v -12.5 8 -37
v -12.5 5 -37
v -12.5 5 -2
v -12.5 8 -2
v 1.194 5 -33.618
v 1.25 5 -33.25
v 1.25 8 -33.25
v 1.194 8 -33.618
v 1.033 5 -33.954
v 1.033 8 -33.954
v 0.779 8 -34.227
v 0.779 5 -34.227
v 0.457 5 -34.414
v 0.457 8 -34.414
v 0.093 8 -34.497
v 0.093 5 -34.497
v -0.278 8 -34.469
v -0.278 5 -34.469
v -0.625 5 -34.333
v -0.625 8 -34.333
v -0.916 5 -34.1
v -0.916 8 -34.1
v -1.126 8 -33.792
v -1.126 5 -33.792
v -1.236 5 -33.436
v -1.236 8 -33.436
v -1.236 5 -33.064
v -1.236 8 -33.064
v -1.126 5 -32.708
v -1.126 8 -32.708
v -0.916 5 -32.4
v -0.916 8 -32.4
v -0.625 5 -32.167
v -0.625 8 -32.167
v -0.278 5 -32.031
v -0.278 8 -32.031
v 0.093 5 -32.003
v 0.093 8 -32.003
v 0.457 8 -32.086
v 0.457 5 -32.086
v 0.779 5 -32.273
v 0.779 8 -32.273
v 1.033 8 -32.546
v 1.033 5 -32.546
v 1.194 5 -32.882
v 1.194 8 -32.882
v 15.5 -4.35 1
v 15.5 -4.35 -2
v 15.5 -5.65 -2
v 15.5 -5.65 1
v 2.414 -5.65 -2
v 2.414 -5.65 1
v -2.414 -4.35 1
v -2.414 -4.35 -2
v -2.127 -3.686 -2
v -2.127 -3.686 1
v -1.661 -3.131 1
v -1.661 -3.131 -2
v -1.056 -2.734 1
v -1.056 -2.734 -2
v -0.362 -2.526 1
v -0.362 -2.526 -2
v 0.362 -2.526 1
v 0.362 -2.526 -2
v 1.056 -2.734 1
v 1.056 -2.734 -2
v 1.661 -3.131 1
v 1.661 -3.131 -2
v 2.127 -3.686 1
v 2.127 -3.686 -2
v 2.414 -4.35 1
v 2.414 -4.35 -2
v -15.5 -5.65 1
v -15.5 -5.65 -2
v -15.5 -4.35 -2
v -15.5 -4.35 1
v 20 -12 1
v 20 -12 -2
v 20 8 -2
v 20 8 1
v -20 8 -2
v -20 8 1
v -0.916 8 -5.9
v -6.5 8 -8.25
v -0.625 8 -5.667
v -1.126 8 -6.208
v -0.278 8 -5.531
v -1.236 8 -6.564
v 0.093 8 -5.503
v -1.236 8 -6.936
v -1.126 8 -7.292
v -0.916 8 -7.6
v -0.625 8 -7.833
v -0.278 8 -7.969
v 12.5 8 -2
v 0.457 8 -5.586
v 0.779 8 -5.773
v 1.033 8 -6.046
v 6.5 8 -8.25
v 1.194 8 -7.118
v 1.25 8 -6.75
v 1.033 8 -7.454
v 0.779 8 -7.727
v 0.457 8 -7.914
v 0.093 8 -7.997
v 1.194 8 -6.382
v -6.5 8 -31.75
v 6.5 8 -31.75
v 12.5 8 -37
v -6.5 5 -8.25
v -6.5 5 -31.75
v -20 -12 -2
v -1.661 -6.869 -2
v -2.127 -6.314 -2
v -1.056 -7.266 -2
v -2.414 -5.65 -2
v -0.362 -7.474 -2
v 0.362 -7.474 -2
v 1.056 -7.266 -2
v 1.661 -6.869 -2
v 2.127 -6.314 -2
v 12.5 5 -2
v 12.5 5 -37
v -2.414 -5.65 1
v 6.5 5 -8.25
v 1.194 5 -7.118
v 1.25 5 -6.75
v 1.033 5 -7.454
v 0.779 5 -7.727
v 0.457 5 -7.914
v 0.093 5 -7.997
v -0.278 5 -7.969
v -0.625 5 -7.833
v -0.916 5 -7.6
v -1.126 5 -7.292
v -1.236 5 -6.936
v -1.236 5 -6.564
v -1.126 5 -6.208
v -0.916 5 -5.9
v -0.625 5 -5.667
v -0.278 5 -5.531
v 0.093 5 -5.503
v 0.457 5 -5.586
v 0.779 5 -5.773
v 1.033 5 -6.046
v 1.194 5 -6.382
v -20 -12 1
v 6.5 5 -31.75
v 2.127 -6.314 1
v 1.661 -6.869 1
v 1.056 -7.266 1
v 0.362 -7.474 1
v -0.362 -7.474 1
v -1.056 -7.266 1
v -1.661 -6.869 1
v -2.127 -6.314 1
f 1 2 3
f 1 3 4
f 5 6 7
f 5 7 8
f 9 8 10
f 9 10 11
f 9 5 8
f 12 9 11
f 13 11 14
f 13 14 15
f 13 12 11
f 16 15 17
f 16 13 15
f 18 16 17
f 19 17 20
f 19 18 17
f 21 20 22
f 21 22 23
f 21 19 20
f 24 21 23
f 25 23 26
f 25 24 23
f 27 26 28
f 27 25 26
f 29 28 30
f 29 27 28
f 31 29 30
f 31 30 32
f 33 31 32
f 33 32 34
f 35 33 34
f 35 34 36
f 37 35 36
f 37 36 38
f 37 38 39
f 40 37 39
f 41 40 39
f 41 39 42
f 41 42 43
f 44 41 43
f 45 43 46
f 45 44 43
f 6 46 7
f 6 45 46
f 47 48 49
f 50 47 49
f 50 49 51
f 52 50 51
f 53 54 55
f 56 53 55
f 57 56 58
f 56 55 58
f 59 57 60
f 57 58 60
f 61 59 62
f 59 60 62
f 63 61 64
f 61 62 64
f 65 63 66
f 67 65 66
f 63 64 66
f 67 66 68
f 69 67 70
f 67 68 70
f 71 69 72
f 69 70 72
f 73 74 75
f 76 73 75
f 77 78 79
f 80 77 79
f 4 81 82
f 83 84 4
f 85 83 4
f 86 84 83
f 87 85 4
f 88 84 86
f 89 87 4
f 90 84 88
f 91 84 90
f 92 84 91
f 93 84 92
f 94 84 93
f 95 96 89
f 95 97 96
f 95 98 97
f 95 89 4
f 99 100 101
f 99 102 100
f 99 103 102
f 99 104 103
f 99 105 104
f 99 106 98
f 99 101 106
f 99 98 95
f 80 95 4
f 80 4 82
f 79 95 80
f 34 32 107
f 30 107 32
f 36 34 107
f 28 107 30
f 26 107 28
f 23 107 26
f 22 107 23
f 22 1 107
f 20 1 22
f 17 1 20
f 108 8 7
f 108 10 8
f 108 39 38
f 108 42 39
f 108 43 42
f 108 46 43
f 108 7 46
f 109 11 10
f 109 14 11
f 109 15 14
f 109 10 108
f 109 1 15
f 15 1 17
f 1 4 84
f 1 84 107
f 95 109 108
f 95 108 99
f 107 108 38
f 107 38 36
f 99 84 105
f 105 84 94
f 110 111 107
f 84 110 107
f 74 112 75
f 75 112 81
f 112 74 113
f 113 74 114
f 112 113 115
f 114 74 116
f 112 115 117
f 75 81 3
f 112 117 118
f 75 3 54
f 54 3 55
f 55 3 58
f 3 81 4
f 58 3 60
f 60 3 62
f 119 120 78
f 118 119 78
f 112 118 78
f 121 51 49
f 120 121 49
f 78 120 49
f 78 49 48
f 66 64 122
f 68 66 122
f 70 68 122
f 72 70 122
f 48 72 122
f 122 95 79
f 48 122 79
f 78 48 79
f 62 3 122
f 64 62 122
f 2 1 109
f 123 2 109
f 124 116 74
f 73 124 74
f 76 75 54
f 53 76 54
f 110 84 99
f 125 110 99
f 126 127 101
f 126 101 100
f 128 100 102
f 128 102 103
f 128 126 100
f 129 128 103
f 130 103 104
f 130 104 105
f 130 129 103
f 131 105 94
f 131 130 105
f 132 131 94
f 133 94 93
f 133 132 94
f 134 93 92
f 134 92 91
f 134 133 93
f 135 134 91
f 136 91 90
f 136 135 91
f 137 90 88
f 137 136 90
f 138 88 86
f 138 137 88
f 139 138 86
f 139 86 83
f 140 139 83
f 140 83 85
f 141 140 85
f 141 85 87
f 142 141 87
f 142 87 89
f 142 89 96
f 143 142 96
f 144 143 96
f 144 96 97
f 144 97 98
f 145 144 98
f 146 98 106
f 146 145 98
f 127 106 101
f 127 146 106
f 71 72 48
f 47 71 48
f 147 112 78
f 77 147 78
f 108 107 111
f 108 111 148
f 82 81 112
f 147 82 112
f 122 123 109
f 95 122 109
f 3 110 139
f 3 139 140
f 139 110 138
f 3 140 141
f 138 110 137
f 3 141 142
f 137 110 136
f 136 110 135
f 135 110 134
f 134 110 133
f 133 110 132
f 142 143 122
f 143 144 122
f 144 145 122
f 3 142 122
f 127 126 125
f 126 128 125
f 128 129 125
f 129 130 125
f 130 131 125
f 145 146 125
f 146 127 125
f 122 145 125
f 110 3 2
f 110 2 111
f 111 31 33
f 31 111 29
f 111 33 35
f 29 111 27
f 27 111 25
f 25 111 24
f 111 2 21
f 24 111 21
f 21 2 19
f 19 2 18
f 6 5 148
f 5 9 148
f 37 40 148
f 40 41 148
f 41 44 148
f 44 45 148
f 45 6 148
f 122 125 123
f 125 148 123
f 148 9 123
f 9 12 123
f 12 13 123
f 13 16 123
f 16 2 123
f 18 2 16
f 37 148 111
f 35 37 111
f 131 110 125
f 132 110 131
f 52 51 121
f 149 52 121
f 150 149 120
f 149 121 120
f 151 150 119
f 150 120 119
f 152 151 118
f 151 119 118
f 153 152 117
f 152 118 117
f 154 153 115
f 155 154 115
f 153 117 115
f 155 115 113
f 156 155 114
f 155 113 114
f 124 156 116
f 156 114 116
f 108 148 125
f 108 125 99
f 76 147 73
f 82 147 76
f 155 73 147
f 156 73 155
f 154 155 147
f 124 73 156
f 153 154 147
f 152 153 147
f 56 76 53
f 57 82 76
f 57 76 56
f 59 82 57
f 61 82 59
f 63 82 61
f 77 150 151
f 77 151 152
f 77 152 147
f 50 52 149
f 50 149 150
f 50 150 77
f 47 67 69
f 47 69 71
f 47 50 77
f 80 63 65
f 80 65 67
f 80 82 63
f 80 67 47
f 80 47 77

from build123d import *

# Parameters (mm, degrees)
ESBO_O1_W                         = 40
ESBO_O1_H                         = 20
RESSALTO_EXTRUS_O1_DEPTH          = 1
ESBO_O3_W                         = 40
ESBO_O3_H                         = 20
RESSALTO_EXTRUS_O2_DEPTH          = 2
CORTE_EXTRUS_O1_REACH             = 25.409
CORTE_EXTRUS_O1_DIRECTION_2_REACH = 25.409
ESBO_O4_W                         = 25
ESBO_O4_H                         = 35
ESBO_O4_R                         = 1.25
ESBO_O4_W_2                       = 13
ESBO_O4_H_2                       = 23.5
ESBO_O4_H_3                       = 3
RESSALTO_EXTRUS_O3_DEPTH          = 3
BODY_MOVE_COPY1_START             = 1
BODY_MOVE_COPY1_OUTLINE_W         = 40
BODY_MOVE_COPY1_OUTLINE_H         = 20
BODY_MOVE_COPY1_DEPTH             = 36
BODY_MOVE_COPY1_START_2           = -37
BODY_MOVE_COPY1_2_OUTLINE_W       = 6
BODY_MOVE_COPY1_2_OUTLINE_H       = 3
BODY_MOVE_COPY1_2_DEPTH           = 36
BODY_MOVE_COPY1_START_3           = -2
BODY_MOVE_COPY1_3_DEPTH           = 1
BODY_MOVE_COPY1_START_4           = -8.25
BODY_MOVE_COPY1_4_OUTLINE_W       = 13
BODY_MOVE_COPY1_4_OUTLINE_H       = 3
BODY_MOVE_COPY1_4_DEPTH           = 6.25
BODY_MOVE_COPY1_5_OUTLINE_W       = 13
BODY_MOVE_COPY1_5_OUTLINE_H       = 3
BODY_MOVE_COPY1_5_DEPTH           = 5.25
BODY_MOVE_COPY1_START_5           = 5
BODY_MOVE_COPY1_6_OUTLINE_R       = 1.25
BODY_MOVE_COPY1_6_DEPTH           = 3


with BuildPart() as part:
    # Esboço1 → Ressalto-extrusão1 (new body)
    with BuildSketch(Plane.XY):
        with Locations((0, -2)):
            Rectangle(ESBO_O1_W, ESBO_O1_H)
    extrude(amount=-RESSALTO_EXTRUS_O1_DEPTH)

    # Esboço3 → Ressalto-extrusão2 (add)
    with BuildSketch(Plane.XY):
        with Locations((0, -2)):
            Rectangle(ESBO_O3_W, ESBO_O3_H)
    extrude(amount=RESSALTO_EXTRUS_O2_DEPTH)

    # Corte-extrusão1: up to this face of the body (flat: up to its plane)
    corte_extrus_o1_end = Plane(part.part.faces().sort_by_distance((0, -2, 2))[0])
    # Esboço2 → Corte-extrusão1 (cut, up to the picked face)
    with BuildSketch(Plane.XY, mode=Mode.PRIVATE) as corte_extrus_o1_sk1:
        with BuildLine():
            Line((-2.414021541, -4.35), (-15.5, -4.35))
            Line((-15.5, -4.35), (-15.5, -5.65))
            Line((-15.5, -5.65), (-2.414021541, -5.65))
            ThreePointArc((-2.414021541, -5.65), (0, -7.5), (2.414021541, -5.65))
            Line((2.414021541, -5.65), (15.5, -5.65))
            Line((15.5, -5.65), (15.5, -4.35))
            Line((15.5, -4.35), (2.414021541, -4.35))
            ThreePointArc((2.414021541, -4.35), (0, -2.5), (-2.414021541, -4.35))
        make_face()
    corte_extrus_o1_tool1 = split(extrude(corte_extrus_o1_sk1.sketch, amount=CORTE_EXTRUS_O1_REACH, mode=Mode.PRIVATE), bisect_by=corte_extrus_o1_end, keep=Keep.BOTH, mode=Mode.PRIVATE)
    add(corte_extrus_o1_tool1.solids().sort_by(Axis((0, -5, 0), (0, 0, 1)))[0], mode=Mode.SUBTRACT)

    # Corte-extrusão1 direction 2: up to this face of the body (flat: up to its plane)
    corte_extrus_o1_direction_2_end = Plane(part.part.faces().sort_by_distance((0, -2, -1))[0])
    # Esboço2 → Corte-extrusão1 direction 2 (cut, up to the picked face)
    with BuildSketch(Plane.XY, mode=Mode.PRIVATE) as corte_extrus_o1_direction_2_sk1:
        with BuildLine():
            Line((-2.414021541, -4.35), (-15.5, -4.35))
            Line((-15.5, -4.35), (-15.5, -5.65))
            Line((-15.5, -5.65), (-2.414021541, -5.65))
            ThreePointArc((-2.414021541, -5.65), (0, -7.5), (2.414021541, -5.65))
            Line((2.414021541, -5.65), (15.5, -5.65))
            Line((15.5, -5.65), (15.5, -4.35))
            Line((15.5, -4.35), (2.414021541, -4.35))
            ThreePointArc((2.414021541, -4.35), (0, -2.5), (-2.414021541, -4.35))
        make_face()
    corte_extrus_o1_direction_2_tool1 = split(extrude(corte_extrus_o1_direction_2_sk1.sketch, amount=-CORTE_EXTRUS_O1_DIRECTION_2_REACH, mode=Mode.PRIVATE), bisect_by=corte_extrus_o1_direction_2_end, keep=Keep.BOTH, mode=Mode.PRIVATE)
    add(corte_extrus_o1_direction_2_tool1.solids().sort_by(Axis((0, -5, 0), (0, 0, -1)))[0], mode=Mode.SUBTRACT)

    # Esboço4 → Ressalto-extrusão3 (add)
    # profile 1 of 2: a face of its own
    with BuildSketch(Plane(origin=(0, 8, 0), x_dir=(1, 0, 0), z_dir=(0, 1, 0))):
        with Locations((0, -19.5)):
            Rectangle(ESBO_O4_W, ESBO_O4_H)
        with Locations(Location((0, -33.25, 0), (0, 0, 180))):
            Circle(ESBO_O4_R, mode=Mode.SUBTRACT)
        with Locations((0, -20)):
            Rectangle(ESBO_O4_W_2, ESBO_O4_H_2, mode=Mode.SUBTRACT)
        with Locations(Location((0, -6.75, 0), (0, 0, 180))):
            Circle(ESBO_O4_R, mode=Mode.SUBTRACT)
    # profile 2 of 2: a face of its own
    with BuildSketch(Plane(origin=(0, 8, 0), x_dir=(1, 0, 0), z_dir=(0, 1, 0))):
        with Locations((0, -0.5)):
            Rectangle(ESBO_O4_W, ESBO_O4_H_3)
    extrude(amount=-RESSALTO_EXTRUS_O3_DEPTH)

    # Body-Move/Copy1: read off the stored shape, not the designer's step
    # Body-Move/Copy1 outline → Body-Move/Copy1 (cut)
    with BuildSketch(Plane.XY.offset(BODY_MOVE_COPY1_START)):
        with Locations((0, -2)):
            Rectangle(BODY_MOVE_COPY1_OUTLINE_W, BODY_MOVE_COPY1_OUTLINE_H)
        with BuildLine():
            ThreePointArc((-2.414021541, -4.35), (0, -2.5), (2.414021541, -4.35))
            Line((2.414021541, -4.35), (15.5, -4.35))
            Line((15.5, -4.35), (15.5, -5.65))
            Line((15.5, -5.65), (2.414021541, -5.65))
            ThreePointArc((2.414021541, -5.65), (0, -7.5), (-2.414021541, -5.65))
            Line((-2.414021541, -5.65), (-15.5, -5.65))
            Line((-15.5, -5.65), (-15.5, -4.35))
            Line((-15.5, -4.35), (-2.414021541, -4.35))
        make_face(mode=Mode.SUBTRACT)
    extrude(amount=BODY_MOVE_COPY1_DEPTH, mode=Mode.SUBTRACT)

    # Body-Move_Copy1 2 outline → Body-Move_Copy1 2 (add)
    with BuildSketch(Plane.XY.offset(BODY_MOVE_COPY1_START_2)):
        with Locations((-9.5, 6.5)):
            Rectangle(BODY_MOVE_COPY1_2_OUTLINE_W, BODY_MOVE_COPY1_2_OUTLINE_H)
        with Locations((9.5, 6.5)):
            Rectangle(BODY_MOVE_COPY1_2_OUTLINE_W, BODY_MOVE_COPY1_2_OUTLINE_H)
    extrude(amount=BODY_MOVE_COPY1_2_DEPTH)

    # Body-Move_Copy1 3 outline → Body-Move_Copy1 3 (add)
    with BuildSketch(Plane.XY.offset(BODY_MOVE_COPY1_START_3)):
        Polygon((-20, 8), (-20, -12), (20, -12), (20, 8), (12.5, 8), (12.5, 5), (6.5, 5), (6.5, 8), (-6.5, 8), (-6.5, 5), (-12.5, 5), (-12.5, 8), align=None)
        with BuildLine():
            ThreePointArc((-2.414021541, -4.35), (0, -2.5), (2.414021541, -4.35))
            Line((2.414021541, -4.35), (15.5, -4.35))
            Line((15.5, -4.35), (15.5, -5.65))
            Line((15.5, -5.65), (2.414021541, -5.65))
            ThreePointArc((2.414021541, -5.65), (0, -7.5), (-2.414021541, -5.65))
            Line((-2.414021541, -5.65), (-15.5, -5.65))
            Line((-15.5, -5.65), (-15.5, -4.35))
            Line((-15.5, -4.35), (-2.414021541, -4.35))
        make_face(mode=Mode.SUBTRACT)
    extrude(amount=BODY_MOVE_COPY1_3_DEPTH)

    # Body-Move_Copy1 4 outline → Body-Move_Copy1 4 (add)
    with BuildSketch(Plane.XY.offset(BODY_MOVE_COPY1_START_4)):
        with Locations((0, 6.5)):
            Rectangle(BODY_MOVE_COPY1_4_OUTLINE_W, BODY_MOVE_COPY1_4_OUTLINE_H)
    extrude(amount=BODY_MOVE_COPY1_4_DEPTH)

    # Body-Move_Copy1 5 outline → Body-Move_Copy1 5 (add)
    with BuildSketch(Plane.XY.offset(BODY_MOVE_COPY1_START_2)):
        with Locations((0, 6.5)):
            Rectangle(BODY_MOVE_COPY1_5_OUTLINE_W, BODY_MOVE_COPY1_5_OUTLINE_H)
    extrude(amount=BODY_MOVE_COPY1_5_DEPTH)

    # Body-Move_Copy1 6 outline → Body-Move_Copy1 6 (cut)
    with BuildSketch(Plane(origin=(0, 0, 0), x_dir=(1, 0, 0), z_dir=(0, 1, 0)).offset(BODY_MOVE_COPY1_START_5)):
        with Locations((0, 6.75)):
            Circle(BODY_MOVE_COPY1_6_OUTLINE_R)
        with Locations((0, 33.25)):
            Circle(BODY_MOVE_COPY1_6_OUTLINE_R)
    extrude(amount=BODY_MOVE_COPY1_6_DEPTH, mode=Mode.SUBTRACT)


solid = part.part
